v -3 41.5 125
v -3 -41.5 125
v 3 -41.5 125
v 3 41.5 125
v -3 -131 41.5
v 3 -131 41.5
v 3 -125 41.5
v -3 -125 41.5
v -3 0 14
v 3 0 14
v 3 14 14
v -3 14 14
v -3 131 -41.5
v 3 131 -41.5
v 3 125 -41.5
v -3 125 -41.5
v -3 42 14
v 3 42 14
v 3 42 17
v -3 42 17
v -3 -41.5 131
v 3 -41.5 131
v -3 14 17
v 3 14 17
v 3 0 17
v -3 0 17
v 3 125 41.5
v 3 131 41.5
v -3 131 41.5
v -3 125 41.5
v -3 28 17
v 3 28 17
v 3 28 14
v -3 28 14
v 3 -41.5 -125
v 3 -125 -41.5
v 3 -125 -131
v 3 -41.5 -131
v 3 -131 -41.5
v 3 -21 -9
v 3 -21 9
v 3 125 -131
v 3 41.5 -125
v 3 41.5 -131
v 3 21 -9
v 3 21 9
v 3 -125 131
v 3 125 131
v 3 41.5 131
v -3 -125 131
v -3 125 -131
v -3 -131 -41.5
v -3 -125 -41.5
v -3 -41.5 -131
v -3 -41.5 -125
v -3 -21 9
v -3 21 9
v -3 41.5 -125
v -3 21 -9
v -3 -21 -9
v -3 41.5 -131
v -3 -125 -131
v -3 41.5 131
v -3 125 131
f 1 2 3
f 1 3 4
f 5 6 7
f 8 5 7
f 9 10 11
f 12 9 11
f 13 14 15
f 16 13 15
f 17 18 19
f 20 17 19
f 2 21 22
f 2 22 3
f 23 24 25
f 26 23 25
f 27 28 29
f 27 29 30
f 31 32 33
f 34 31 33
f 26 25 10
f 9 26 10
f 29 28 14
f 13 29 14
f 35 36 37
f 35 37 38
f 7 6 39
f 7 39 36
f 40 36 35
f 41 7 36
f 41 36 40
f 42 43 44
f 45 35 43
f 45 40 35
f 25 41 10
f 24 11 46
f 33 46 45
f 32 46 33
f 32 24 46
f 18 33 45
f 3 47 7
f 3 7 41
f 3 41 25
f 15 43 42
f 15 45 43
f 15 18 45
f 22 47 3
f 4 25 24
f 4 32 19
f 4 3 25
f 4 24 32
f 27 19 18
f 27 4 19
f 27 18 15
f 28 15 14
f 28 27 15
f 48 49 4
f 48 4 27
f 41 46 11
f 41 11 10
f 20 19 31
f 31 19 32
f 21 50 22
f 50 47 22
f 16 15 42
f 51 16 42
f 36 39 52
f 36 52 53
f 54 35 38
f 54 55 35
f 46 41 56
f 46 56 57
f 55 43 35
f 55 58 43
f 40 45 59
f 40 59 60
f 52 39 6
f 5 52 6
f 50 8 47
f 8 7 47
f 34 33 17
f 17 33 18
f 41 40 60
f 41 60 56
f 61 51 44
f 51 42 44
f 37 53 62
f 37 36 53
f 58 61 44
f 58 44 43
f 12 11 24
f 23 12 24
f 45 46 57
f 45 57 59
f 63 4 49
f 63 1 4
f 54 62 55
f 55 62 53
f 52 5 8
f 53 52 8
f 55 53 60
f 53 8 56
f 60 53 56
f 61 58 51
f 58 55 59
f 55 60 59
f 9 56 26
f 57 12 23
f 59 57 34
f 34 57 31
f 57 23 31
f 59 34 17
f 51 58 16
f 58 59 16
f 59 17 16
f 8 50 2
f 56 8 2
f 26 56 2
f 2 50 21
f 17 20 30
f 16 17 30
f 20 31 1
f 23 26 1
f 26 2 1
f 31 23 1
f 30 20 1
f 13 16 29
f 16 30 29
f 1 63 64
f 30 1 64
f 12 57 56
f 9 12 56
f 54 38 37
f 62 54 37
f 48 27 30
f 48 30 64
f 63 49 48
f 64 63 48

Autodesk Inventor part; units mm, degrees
ref_plane "YZ Plane" through (0, 0, 0) normal (1, 0, 0) x (0, 1, 0)
ref_plane "XZ Plane" through (0, 0, 0) normal (0, 1, 0) x (-1, 0, 0)
ref_plane "XY Plane" through (0, 0, 0) normal (0, 0, 1) x (1, 0, 0)
sketch "Esboço1" plane through (0, 0, 0) normal (1, 0, 0) x (0, 1, 0)
  line L0 (-131, 131) -> (131, 131)
  line L1 (131, 131) -> (131, -131)
  line L2 (131, -131) -> (-131, -131)
  line L3 (-131, -131) -> (-131, 131)
  line L4 (-131, 131) -> (131, -131) construction
  line L5 (131, 131) -> (-131, -131) construction
  line L6 (-15, 9) -> (15, 9)
  line L7 (15, 9) -> (15, -9)
  line L8 (15, -9) -> (-15, -9)
  line L9 (-15, -9) -> (-15, 9)
  line L10 (-15, 9) -> (15, -9) construction
  line L11 (15, 9) -> (-15, -9) construction
  point P0 (0, 0)
  dimension "d0" = 262
  dimension "d1" = 262
  dimension "d35" = 30
  dimension "d36" = 18
extrude "Extrusão1" add sketch "Esboço1" along normal mid plane 6 contours L0 L1 L2 L3 | L6 L7 L8 L9
sketch "Esboço2" plane through (3, 0, 0) normal (1, 0, 0) x (0, 0, -1)
  line L0 (131, 131) -> (-131, 131) projected
  line L1 (-131, 131) -> (-41.5, 131)
  line L2 (-41.5, 131) -> (-41.5, 125)
  line L3 (-41.5, 125) -> (-131, 125)
  line L4 (-131, 125) -> (-131, 131)
  line L5 (131, 131) -> (41.5, 131)
  line L6 (41.5, 131) -> (41.5, 125)
  line L7 (41.5, 125) -> (131, 125)
  line L8 (131, 125) -> (131, 131)
  line L9 (-131, 131) -> (-131, -131) projected
  line L10 (-131, -131) -> (-41.5, -131)
  line L11 (-41.5, -131) -> (-41.5, -125)
  line L12 (-41.5, -125) -> (-131, -125)
  line L13 (-131, -125) -> (-131, -131)
  line L14 (131, -131) -> (131, 131) projected
  line L15 (131, -131) -> (41.5, -131)
  line L16 (41.5, -131) -> (41.5, -125)
  line L17 (41.5, -125) -> (131, -125)
  line L18 (131, -125) -> (131, -131)
  point P0 (0, 0)
  point P1 (131, -125)
  point P2 (-131, -125)
  point P3 (41.5, 131)
  dimension "d4" = 89.5
  dimension "d5" = 6
  dimension "d6" = 89.5
  dimension "d7" = 6
  dimension "d8" = 83
  dimension "d9" = 89.5
  dimension "d10" = 6
  dimension "d11" = 89.5
  dimension "d12" = 6
  dimension "d13" = 83
extrude "Extrusão2" cut sketch "Esboço2" along normal through all both and the other way through all
sketch "Esboço3" plane through (3, 0, 0) normal (1, 0, 0) x (0, 0, -1)
  line L0 (-125, 41.5) -> (-137, 41.5)
  line L1 (-137, 41.5) -> (-137, -41.5)
  line L2 (-137, -41.5) -> (-125, -41.5)
  line L3 (-125, -41.5) -> (-125, 41.5)
  line L4 (-131, -125) -> (-131, 125) projected
  line L5 (-125, 41.5) -> (-137, -41.5) construction
  line L6 (-137, 41.5) -> (-125, -41.5) construction
  line L7 (125, -41.5) -> (137, -41.5)
  line L8 (137, -41.5) -> (137, 41.5)
  line L9 (137, 41.5) -> (125, 41.5)
  line L10 (125, 41.5) -> (125, -41.5)
  line L11 (131, 125) -> (131, -125) projected
  line L12 (125, -41.5) -> (137, 41.5) construction
  line L13 (137, -41.5) -> (125, 41.5) construction
  line L14 (-41.5, 125) -> (-131, 125) projected
  line L15 (-131, -125) -> (-41.5, -125) projected
  line L16 (131, 125) -> (41.5, 125) projected
  line L17 (41.5, -125) -> (131, -125) projected
  point P0 (0, 0)
  point P1 (-131, 0)
  point P2 (131, 0)
  dimension "d16" = 83
  dimension "d17" = 12
  dimension "d18" = 12
  dimension "d19" = 83
  dimension "d20" = 83.5
  dimension "d21" = 83.5
  dimension "d22" = 83.5
  dimension "d23" = 83.5
extrude "Extrusão3" cut sketch "Esboço3" along normal through all both and the other way through all
sketch "Esboço7" plane through (3, 0, 0) normal (1, 0, 0) x (0, 0, -1)
  line L0 (-9, 21) -> (9, 21)
  line L1 (9, 21) -> (9, -21)
  line L2 (9, -21) -> (-9, -21)
  line L3 (-9, -21) -> (-9, 21)
  line L4 (-9, 21) -> (9, -21) construction
  line L5 (9, 21) -> (-9, -21) construction
  point P0 (0, 0)
  dimension "d37" = 18
  dimension "d38" = 42
extrude "Extrusão6" cut sketch "Esboço7" against normal through all
sketch "Esboço11" plane through (3, 0, 0) normal (1, 0, 0) x (0, 0, -1)
  line L0 (-17, 0) -> (-14, 0)
  line L1 (-14, 0) -> (-14, 14)
  line L2 (-14, 14) -> (-17, 14)
  line L3 (-17, 14) -> (-17, 0)
  line L4 (-9, -21) -> (-9, 21) projected
  line L5 (-17, 28) -> (-14, 28)
  line L6 (-14, 28) -> (-14, 42)
  line L7 (-14, 42) -> (-17, 42)
  line L8 (-17, 42) -> (-17, 28)
  point P0 (0, 0)
  dimension "d41" = 3
  dimension "d42" = 8
  dimension "d43" = 14
  dimension "d44" = 14
  dimension "d45" = 3
  dimension "d46" = 8
  dimension "d47" = 14
  dimension "d48" = 14
extrude "Extrusão7" cut sketch "Esboço11" against normal through all
properties part number "TOPO DO POÇO 6 mm (fixed)"
